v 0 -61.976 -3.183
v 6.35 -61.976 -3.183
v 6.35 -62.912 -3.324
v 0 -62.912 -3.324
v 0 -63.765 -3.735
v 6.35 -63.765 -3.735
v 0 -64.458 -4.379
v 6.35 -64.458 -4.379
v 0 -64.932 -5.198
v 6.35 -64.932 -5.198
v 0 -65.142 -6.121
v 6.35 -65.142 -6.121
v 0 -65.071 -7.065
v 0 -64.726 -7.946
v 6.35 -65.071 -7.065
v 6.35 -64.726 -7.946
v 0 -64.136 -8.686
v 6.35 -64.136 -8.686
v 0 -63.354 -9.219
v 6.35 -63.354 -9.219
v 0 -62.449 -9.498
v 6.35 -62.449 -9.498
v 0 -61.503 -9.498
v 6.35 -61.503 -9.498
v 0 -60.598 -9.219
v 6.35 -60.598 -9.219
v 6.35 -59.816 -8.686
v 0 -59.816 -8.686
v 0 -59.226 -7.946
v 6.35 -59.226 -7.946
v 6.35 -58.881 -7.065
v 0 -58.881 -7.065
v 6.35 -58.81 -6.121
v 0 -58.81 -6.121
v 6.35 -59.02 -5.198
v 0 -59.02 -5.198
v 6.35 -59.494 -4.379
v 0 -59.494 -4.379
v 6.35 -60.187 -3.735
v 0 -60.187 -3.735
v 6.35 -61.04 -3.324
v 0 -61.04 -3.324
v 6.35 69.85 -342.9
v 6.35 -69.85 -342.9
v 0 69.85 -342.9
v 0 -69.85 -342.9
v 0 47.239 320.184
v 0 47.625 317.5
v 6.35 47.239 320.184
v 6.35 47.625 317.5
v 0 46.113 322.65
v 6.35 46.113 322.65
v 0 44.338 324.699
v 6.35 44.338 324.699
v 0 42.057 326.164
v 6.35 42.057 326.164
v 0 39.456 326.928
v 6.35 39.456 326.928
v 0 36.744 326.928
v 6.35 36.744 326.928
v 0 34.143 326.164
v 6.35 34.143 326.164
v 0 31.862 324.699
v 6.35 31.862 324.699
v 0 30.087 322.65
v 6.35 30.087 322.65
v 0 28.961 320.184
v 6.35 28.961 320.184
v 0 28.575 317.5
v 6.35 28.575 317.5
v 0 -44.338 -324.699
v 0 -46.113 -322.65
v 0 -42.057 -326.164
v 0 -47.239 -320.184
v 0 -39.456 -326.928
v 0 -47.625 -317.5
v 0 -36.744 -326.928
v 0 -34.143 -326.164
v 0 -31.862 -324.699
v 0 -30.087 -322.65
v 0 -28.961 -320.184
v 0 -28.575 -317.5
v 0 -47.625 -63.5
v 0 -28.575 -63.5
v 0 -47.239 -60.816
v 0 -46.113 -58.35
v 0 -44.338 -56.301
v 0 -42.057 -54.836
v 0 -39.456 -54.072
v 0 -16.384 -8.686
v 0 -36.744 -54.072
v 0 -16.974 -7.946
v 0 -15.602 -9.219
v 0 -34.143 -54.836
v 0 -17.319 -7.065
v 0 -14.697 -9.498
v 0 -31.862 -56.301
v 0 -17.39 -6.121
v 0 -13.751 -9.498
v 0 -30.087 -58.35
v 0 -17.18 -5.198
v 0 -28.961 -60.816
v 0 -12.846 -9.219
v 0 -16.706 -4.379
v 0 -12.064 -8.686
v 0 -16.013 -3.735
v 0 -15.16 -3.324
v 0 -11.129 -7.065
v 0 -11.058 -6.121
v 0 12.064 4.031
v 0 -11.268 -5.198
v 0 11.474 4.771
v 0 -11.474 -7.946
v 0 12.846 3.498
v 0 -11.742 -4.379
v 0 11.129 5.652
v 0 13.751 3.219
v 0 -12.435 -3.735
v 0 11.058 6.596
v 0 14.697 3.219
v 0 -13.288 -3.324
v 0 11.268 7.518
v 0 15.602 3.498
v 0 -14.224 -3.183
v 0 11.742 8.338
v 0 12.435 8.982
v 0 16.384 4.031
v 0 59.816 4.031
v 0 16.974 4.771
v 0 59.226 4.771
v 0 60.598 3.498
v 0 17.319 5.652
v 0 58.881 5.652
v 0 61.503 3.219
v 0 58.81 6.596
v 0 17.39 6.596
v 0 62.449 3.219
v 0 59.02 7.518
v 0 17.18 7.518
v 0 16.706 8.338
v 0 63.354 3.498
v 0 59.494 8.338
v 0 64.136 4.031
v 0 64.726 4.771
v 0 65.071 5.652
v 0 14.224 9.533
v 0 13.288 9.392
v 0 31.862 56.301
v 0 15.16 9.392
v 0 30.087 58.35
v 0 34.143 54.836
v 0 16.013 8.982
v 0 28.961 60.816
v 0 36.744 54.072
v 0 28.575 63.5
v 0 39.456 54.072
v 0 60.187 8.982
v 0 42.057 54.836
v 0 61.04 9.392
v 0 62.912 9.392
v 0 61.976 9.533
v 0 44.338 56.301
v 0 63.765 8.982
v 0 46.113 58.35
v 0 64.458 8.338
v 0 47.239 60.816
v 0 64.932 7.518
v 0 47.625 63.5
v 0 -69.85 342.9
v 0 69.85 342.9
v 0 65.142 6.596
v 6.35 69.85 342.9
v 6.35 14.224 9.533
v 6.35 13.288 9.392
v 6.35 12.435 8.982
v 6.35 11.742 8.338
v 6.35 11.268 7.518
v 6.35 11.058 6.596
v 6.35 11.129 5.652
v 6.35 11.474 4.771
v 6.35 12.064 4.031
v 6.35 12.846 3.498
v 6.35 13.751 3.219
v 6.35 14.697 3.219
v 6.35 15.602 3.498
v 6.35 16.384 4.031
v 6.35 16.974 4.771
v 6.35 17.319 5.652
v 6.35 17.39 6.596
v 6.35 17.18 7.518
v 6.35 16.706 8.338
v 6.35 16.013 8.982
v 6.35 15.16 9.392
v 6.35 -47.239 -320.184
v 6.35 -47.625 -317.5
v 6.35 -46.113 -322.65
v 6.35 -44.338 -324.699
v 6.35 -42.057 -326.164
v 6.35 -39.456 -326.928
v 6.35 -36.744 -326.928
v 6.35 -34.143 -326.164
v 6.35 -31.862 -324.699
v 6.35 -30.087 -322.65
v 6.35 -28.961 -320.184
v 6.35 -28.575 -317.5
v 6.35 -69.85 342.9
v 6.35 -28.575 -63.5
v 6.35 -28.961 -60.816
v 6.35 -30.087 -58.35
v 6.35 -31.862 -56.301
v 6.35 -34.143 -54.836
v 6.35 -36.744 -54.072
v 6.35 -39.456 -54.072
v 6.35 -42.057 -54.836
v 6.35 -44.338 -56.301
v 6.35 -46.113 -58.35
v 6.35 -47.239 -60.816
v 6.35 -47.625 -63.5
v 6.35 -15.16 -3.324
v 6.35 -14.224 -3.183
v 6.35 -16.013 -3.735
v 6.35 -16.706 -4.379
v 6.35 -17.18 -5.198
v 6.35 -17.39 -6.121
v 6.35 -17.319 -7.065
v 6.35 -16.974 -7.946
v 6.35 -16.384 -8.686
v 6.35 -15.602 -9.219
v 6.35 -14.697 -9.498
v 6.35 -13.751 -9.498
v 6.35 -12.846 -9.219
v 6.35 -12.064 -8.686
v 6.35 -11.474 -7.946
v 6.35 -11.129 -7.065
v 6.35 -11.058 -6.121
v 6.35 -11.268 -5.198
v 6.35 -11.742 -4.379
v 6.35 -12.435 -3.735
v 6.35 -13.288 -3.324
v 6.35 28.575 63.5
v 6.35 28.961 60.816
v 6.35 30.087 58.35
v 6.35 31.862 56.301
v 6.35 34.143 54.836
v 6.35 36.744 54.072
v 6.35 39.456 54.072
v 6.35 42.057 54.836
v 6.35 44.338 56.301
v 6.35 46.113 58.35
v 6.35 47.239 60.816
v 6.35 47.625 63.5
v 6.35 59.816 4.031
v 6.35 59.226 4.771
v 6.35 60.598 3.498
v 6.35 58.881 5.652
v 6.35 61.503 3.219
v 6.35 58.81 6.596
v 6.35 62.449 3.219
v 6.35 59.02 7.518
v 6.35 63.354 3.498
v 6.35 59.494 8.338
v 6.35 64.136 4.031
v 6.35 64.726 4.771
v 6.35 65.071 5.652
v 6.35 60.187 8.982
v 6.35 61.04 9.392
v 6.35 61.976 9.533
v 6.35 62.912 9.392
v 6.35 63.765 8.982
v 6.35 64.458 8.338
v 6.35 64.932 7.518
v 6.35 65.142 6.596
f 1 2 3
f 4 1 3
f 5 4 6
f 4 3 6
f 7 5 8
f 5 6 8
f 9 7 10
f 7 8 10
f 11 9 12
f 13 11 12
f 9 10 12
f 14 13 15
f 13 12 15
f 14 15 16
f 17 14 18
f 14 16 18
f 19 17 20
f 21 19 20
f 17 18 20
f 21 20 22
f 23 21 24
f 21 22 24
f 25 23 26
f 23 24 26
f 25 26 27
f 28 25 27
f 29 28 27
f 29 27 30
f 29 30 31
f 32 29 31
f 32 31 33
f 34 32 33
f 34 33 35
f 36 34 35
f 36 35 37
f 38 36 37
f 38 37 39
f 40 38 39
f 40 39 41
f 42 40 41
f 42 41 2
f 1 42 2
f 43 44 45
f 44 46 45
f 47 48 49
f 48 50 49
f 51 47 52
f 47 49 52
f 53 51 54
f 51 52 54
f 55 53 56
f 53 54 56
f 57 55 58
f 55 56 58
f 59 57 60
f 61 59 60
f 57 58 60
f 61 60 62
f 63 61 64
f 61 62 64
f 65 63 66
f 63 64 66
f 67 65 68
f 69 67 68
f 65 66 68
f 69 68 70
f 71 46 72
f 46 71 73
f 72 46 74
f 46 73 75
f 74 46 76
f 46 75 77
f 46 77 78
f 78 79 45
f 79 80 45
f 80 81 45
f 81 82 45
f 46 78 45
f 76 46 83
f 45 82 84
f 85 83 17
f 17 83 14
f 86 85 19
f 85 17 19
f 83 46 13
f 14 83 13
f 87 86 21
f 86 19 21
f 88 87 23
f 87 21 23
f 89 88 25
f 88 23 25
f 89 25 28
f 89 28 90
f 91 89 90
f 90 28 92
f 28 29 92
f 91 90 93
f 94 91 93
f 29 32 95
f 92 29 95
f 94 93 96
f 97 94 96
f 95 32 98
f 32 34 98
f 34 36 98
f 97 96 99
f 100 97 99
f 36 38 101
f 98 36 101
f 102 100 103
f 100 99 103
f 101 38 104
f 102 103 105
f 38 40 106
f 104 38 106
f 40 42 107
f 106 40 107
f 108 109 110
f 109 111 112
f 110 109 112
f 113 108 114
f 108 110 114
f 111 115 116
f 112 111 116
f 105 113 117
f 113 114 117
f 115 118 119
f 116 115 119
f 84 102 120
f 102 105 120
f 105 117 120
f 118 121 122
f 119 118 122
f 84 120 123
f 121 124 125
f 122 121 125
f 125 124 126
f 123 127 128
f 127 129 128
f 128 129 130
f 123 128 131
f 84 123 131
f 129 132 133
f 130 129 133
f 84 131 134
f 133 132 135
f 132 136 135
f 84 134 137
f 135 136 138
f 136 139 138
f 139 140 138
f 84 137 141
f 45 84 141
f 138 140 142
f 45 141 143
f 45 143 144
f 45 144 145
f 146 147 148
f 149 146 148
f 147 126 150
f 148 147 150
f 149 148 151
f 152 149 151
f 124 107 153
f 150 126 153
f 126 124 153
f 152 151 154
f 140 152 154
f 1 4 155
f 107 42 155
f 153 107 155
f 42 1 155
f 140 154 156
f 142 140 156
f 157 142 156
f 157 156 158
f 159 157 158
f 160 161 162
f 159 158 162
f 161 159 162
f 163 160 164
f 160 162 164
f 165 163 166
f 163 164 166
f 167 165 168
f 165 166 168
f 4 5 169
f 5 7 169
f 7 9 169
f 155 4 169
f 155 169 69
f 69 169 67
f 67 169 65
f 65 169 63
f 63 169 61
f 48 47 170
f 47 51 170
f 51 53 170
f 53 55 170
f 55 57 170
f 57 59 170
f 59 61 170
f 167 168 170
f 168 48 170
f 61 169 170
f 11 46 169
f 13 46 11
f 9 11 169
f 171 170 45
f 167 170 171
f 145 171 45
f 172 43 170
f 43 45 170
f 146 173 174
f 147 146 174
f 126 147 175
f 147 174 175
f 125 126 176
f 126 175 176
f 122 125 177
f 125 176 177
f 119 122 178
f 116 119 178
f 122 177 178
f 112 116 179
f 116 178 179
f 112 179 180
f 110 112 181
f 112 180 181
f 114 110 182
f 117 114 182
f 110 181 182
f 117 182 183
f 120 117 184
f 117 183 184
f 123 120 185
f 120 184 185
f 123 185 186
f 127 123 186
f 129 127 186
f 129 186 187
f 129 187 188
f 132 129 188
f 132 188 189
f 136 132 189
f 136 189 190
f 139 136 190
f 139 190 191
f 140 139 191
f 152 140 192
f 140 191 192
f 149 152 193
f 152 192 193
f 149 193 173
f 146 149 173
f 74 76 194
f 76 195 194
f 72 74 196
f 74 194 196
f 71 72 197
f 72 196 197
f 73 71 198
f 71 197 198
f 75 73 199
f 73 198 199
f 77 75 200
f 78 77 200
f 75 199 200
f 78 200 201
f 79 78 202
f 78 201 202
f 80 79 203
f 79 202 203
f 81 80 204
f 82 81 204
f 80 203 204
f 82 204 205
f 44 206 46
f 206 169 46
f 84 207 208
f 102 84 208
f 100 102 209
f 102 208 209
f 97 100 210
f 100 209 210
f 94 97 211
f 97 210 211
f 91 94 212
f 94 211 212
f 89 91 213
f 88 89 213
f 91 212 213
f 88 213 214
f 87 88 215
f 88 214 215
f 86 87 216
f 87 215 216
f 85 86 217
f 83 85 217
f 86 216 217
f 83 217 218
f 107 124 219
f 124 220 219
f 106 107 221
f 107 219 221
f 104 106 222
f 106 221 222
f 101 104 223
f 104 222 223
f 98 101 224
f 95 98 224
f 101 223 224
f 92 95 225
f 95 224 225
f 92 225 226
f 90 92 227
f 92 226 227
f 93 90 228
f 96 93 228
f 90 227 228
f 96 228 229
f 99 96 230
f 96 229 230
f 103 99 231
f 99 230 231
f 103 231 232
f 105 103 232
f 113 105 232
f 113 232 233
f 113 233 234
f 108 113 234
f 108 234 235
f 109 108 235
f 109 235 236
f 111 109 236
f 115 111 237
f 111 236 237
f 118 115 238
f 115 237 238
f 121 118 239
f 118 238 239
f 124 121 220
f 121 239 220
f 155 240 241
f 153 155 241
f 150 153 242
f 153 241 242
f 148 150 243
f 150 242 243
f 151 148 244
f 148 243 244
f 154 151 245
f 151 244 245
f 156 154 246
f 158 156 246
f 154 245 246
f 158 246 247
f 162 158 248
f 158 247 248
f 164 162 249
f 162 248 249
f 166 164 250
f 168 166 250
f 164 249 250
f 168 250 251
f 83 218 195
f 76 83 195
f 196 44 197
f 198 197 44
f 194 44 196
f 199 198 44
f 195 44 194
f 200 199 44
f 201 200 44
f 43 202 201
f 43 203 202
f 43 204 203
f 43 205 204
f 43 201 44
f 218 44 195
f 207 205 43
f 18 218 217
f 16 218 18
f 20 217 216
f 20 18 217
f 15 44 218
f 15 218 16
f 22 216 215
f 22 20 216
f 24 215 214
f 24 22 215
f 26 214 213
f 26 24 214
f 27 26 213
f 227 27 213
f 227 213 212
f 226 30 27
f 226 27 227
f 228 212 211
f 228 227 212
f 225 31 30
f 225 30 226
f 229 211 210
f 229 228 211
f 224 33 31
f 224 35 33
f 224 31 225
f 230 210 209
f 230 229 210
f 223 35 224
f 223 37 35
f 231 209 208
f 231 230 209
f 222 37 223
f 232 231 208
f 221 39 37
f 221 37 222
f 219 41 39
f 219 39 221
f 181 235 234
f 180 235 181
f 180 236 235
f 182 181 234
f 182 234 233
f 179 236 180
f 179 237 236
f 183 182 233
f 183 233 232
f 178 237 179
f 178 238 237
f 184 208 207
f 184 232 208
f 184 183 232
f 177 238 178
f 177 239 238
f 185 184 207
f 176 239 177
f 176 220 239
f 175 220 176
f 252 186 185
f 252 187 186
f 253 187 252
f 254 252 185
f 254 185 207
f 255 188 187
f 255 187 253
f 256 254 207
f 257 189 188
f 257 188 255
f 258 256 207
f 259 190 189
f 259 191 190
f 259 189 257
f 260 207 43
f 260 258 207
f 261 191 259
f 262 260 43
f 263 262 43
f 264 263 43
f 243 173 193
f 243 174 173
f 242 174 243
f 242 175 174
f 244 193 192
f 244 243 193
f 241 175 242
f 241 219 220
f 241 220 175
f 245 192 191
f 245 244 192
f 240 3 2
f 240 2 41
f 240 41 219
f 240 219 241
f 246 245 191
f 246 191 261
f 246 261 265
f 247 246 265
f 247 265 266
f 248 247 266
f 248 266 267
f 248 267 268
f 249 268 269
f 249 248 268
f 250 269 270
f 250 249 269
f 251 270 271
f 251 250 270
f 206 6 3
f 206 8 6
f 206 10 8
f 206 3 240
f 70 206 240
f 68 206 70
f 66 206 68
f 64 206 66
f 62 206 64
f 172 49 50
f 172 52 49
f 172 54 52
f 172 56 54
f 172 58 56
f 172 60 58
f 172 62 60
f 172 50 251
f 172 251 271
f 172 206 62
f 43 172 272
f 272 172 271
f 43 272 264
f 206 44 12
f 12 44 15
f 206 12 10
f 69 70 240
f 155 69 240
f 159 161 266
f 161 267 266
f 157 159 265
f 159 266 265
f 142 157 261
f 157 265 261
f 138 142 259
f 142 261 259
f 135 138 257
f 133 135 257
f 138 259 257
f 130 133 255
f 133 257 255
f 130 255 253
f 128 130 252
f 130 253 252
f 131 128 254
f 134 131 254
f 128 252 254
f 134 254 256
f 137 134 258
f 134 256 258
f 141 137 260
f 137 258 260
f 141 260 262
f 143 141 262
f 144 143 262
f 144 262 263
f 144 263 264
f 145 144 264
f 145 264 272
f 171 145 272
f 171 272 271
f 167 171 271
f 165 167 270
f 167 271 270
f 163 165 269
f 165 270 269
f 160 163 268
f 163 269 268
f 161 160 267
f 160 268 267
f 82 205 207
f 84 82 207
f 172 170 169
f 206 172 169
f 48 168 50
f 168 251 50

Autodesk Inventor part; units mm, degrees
ref_plane "YZ Plane" through (0, 0, 0) normal (1, 0, 0) x (0, 1, 0)
ref_plane "XZ Plane" through (0, 0, 0) normal (0, 1, 0) x (-1, 0, 0)
ref_plane "XY Plane" through (0, 0, 0) normal (0, 0, 1) x (1, 0, 0)
sketch "Sketch1" plane through (0, 0, 0) normal (1, 0, 0) x (0, 1, 0)
  line L0 (-69.85, 342.9) -> (-69.85, -342.9)
  line L1 (-69.85, -342.9) -> (69.85, -342.9)
  line L2 (69.85, -342.9) -> (69.85, 342.9)
  line L3 (69.85, 342.9) -> (-69.85, 342.9)
  line L4 (-69.85, 342.9) -> (69.85, -342.9) construction
  line L5 (-69.85, -342.9) -> (69.85, 342.9) construction
  point P0 (0, 0)
  dimension "width" = 685.8
  dimension "height" = 139.7
extrude "Extrusion1" add sketch "Sketch1" along normal blind 6.35
sketch "Sketch2" plane through (6.35, 0, 0) normal (1, 0, 0) x (0, 0, -1)
  line L0 (-317.5, 38.1) -> (-63.5, 38.1) construction
  line L1 (-317.5, 28.575) -> (-63.5, 28.575)
  line L2 (-63.5, 47.625) -> (-317.5, 47.625)
  arc A0 (-317.5, 47.625) -> (-317.5, 28.575) centre (-317.5, 38.1) ccw
  arc A1 (-63.5, 28.575) -> (-63.5, 47.625) centre (-63.5, 38.1) ccw
  line L3 (342.9, 69.85) -> (-342.9, 69.85) projected
  line L4 (-342.9, 69.85) -> (-342.9, -69.85) projected
  line L5 (63.5, -38.1) -> (317.5, -38.1) construction
  line L6 (63.5, -47.625) -> (317.5, -47.625)
  line L7 (317.5, -28.575) -> (63.5, -28.575)
  arc A2 (63.5, -28.575) -> (63.5, -47.625) centre (63.5, -38.1) ccw
  arc A3 (317.5, -47.625) -> (317.5, -28.575) centre (317.5, -38.1) ccw
  line L8 (-342.9, -69.85) -> (342.9, -69.85) projected
  line L9 (342.9, -69.85) -> (342.9, 69.85) projected
  point P0 (0, 0)
  point P1 (-190.5, 38.1)
  point P2 (190.5, -38.1)
  dimension "slot_center_from_top" = 31.75
  dimension "slot_center_from_side" = 152.4
  dimension "slot_radius" = 9.525
  dimension "d7" = 31.75
  dimension "d8" = 152.4
  dimension "d9" = 9.525
  dimension "length_of_slot" = 254
  dimension "d13" = 254
extrude "Extrusion2" cut sketch "Sketch2" against normal through all contours A0 L2 A1 L1 | A2 L7 A3 L6
sketch "Sketch3" plane through (0, 0, 0) normal (-1, 0, 0) x (0, 0, 1)
  line L0 (-342.9, 69.85) -> (342.9, 69.85) construction
  line L1 (6.3584, 69.85) -> (6.3584, -72.7678) construction
  line L2 (342.9, 69.85) -> (342.9, -69.85) construction
  line L3 (-6.3584, 69.85) -> (-6.3584, -69.85) construction
  line L4 (-342.9, -69.85) -> (-342.9, 69.85) construction
  line L5 (-6.3584, 61.976) -> (6.3584, 61.976) construction
  line L6 (-6.3584, -61.976) -> (6.3584, -61.976) construction
  line L7 (342.9, -69.85) -> (-342.9, -69.85) construction
  line L8 (-6.3584, 14.224) -> (6.3584, 14.224) construction
  line L9 (-6.3584, -14.224) -> (6.3584, -14.224) construction
  point P0 (0, 0)
  point P1 (80.6051, 237.827)
  point P2 (47.886, -92.9067)
  dimension "Vertical_Line_For_Bolt_Holes" = 336.5416
  dimension "d15" = 336.5416
  dimension "First_Horizontal_Line" = 7.874
  dimension "d17" = 7.874
  dimension "Second_Horizontal_Line" = 47.752
  dimension "d19" = 47.752
hole "Hole1" at (0, 61.976, 6.3584) at (0, -61.976, -6.3584) at (0, 237.827, 80.6051) at (0, -92.9067, 47.886) at (0, 14.224, 6.3584) at (0, -14.224, -6.3584) direction (1, 0, 0) diameter 6.35 end through all
equation "\"d7\" = slot_center_from_top"
equation "\"d8\" = slot_center_from_side"
equation "\"d9\" = slot_radius"
equation "\"d13\" = length_of_slot"
equation "\"d15\" = Vertical_Line_For_Bolt_Holes"
equation "\"d17\" = First_Horizontal_Line"
equation "\"d19\" = Second_Horizontal_Line"
properties part number "Plot for Gripper-09" material "Aluminum 6061"
